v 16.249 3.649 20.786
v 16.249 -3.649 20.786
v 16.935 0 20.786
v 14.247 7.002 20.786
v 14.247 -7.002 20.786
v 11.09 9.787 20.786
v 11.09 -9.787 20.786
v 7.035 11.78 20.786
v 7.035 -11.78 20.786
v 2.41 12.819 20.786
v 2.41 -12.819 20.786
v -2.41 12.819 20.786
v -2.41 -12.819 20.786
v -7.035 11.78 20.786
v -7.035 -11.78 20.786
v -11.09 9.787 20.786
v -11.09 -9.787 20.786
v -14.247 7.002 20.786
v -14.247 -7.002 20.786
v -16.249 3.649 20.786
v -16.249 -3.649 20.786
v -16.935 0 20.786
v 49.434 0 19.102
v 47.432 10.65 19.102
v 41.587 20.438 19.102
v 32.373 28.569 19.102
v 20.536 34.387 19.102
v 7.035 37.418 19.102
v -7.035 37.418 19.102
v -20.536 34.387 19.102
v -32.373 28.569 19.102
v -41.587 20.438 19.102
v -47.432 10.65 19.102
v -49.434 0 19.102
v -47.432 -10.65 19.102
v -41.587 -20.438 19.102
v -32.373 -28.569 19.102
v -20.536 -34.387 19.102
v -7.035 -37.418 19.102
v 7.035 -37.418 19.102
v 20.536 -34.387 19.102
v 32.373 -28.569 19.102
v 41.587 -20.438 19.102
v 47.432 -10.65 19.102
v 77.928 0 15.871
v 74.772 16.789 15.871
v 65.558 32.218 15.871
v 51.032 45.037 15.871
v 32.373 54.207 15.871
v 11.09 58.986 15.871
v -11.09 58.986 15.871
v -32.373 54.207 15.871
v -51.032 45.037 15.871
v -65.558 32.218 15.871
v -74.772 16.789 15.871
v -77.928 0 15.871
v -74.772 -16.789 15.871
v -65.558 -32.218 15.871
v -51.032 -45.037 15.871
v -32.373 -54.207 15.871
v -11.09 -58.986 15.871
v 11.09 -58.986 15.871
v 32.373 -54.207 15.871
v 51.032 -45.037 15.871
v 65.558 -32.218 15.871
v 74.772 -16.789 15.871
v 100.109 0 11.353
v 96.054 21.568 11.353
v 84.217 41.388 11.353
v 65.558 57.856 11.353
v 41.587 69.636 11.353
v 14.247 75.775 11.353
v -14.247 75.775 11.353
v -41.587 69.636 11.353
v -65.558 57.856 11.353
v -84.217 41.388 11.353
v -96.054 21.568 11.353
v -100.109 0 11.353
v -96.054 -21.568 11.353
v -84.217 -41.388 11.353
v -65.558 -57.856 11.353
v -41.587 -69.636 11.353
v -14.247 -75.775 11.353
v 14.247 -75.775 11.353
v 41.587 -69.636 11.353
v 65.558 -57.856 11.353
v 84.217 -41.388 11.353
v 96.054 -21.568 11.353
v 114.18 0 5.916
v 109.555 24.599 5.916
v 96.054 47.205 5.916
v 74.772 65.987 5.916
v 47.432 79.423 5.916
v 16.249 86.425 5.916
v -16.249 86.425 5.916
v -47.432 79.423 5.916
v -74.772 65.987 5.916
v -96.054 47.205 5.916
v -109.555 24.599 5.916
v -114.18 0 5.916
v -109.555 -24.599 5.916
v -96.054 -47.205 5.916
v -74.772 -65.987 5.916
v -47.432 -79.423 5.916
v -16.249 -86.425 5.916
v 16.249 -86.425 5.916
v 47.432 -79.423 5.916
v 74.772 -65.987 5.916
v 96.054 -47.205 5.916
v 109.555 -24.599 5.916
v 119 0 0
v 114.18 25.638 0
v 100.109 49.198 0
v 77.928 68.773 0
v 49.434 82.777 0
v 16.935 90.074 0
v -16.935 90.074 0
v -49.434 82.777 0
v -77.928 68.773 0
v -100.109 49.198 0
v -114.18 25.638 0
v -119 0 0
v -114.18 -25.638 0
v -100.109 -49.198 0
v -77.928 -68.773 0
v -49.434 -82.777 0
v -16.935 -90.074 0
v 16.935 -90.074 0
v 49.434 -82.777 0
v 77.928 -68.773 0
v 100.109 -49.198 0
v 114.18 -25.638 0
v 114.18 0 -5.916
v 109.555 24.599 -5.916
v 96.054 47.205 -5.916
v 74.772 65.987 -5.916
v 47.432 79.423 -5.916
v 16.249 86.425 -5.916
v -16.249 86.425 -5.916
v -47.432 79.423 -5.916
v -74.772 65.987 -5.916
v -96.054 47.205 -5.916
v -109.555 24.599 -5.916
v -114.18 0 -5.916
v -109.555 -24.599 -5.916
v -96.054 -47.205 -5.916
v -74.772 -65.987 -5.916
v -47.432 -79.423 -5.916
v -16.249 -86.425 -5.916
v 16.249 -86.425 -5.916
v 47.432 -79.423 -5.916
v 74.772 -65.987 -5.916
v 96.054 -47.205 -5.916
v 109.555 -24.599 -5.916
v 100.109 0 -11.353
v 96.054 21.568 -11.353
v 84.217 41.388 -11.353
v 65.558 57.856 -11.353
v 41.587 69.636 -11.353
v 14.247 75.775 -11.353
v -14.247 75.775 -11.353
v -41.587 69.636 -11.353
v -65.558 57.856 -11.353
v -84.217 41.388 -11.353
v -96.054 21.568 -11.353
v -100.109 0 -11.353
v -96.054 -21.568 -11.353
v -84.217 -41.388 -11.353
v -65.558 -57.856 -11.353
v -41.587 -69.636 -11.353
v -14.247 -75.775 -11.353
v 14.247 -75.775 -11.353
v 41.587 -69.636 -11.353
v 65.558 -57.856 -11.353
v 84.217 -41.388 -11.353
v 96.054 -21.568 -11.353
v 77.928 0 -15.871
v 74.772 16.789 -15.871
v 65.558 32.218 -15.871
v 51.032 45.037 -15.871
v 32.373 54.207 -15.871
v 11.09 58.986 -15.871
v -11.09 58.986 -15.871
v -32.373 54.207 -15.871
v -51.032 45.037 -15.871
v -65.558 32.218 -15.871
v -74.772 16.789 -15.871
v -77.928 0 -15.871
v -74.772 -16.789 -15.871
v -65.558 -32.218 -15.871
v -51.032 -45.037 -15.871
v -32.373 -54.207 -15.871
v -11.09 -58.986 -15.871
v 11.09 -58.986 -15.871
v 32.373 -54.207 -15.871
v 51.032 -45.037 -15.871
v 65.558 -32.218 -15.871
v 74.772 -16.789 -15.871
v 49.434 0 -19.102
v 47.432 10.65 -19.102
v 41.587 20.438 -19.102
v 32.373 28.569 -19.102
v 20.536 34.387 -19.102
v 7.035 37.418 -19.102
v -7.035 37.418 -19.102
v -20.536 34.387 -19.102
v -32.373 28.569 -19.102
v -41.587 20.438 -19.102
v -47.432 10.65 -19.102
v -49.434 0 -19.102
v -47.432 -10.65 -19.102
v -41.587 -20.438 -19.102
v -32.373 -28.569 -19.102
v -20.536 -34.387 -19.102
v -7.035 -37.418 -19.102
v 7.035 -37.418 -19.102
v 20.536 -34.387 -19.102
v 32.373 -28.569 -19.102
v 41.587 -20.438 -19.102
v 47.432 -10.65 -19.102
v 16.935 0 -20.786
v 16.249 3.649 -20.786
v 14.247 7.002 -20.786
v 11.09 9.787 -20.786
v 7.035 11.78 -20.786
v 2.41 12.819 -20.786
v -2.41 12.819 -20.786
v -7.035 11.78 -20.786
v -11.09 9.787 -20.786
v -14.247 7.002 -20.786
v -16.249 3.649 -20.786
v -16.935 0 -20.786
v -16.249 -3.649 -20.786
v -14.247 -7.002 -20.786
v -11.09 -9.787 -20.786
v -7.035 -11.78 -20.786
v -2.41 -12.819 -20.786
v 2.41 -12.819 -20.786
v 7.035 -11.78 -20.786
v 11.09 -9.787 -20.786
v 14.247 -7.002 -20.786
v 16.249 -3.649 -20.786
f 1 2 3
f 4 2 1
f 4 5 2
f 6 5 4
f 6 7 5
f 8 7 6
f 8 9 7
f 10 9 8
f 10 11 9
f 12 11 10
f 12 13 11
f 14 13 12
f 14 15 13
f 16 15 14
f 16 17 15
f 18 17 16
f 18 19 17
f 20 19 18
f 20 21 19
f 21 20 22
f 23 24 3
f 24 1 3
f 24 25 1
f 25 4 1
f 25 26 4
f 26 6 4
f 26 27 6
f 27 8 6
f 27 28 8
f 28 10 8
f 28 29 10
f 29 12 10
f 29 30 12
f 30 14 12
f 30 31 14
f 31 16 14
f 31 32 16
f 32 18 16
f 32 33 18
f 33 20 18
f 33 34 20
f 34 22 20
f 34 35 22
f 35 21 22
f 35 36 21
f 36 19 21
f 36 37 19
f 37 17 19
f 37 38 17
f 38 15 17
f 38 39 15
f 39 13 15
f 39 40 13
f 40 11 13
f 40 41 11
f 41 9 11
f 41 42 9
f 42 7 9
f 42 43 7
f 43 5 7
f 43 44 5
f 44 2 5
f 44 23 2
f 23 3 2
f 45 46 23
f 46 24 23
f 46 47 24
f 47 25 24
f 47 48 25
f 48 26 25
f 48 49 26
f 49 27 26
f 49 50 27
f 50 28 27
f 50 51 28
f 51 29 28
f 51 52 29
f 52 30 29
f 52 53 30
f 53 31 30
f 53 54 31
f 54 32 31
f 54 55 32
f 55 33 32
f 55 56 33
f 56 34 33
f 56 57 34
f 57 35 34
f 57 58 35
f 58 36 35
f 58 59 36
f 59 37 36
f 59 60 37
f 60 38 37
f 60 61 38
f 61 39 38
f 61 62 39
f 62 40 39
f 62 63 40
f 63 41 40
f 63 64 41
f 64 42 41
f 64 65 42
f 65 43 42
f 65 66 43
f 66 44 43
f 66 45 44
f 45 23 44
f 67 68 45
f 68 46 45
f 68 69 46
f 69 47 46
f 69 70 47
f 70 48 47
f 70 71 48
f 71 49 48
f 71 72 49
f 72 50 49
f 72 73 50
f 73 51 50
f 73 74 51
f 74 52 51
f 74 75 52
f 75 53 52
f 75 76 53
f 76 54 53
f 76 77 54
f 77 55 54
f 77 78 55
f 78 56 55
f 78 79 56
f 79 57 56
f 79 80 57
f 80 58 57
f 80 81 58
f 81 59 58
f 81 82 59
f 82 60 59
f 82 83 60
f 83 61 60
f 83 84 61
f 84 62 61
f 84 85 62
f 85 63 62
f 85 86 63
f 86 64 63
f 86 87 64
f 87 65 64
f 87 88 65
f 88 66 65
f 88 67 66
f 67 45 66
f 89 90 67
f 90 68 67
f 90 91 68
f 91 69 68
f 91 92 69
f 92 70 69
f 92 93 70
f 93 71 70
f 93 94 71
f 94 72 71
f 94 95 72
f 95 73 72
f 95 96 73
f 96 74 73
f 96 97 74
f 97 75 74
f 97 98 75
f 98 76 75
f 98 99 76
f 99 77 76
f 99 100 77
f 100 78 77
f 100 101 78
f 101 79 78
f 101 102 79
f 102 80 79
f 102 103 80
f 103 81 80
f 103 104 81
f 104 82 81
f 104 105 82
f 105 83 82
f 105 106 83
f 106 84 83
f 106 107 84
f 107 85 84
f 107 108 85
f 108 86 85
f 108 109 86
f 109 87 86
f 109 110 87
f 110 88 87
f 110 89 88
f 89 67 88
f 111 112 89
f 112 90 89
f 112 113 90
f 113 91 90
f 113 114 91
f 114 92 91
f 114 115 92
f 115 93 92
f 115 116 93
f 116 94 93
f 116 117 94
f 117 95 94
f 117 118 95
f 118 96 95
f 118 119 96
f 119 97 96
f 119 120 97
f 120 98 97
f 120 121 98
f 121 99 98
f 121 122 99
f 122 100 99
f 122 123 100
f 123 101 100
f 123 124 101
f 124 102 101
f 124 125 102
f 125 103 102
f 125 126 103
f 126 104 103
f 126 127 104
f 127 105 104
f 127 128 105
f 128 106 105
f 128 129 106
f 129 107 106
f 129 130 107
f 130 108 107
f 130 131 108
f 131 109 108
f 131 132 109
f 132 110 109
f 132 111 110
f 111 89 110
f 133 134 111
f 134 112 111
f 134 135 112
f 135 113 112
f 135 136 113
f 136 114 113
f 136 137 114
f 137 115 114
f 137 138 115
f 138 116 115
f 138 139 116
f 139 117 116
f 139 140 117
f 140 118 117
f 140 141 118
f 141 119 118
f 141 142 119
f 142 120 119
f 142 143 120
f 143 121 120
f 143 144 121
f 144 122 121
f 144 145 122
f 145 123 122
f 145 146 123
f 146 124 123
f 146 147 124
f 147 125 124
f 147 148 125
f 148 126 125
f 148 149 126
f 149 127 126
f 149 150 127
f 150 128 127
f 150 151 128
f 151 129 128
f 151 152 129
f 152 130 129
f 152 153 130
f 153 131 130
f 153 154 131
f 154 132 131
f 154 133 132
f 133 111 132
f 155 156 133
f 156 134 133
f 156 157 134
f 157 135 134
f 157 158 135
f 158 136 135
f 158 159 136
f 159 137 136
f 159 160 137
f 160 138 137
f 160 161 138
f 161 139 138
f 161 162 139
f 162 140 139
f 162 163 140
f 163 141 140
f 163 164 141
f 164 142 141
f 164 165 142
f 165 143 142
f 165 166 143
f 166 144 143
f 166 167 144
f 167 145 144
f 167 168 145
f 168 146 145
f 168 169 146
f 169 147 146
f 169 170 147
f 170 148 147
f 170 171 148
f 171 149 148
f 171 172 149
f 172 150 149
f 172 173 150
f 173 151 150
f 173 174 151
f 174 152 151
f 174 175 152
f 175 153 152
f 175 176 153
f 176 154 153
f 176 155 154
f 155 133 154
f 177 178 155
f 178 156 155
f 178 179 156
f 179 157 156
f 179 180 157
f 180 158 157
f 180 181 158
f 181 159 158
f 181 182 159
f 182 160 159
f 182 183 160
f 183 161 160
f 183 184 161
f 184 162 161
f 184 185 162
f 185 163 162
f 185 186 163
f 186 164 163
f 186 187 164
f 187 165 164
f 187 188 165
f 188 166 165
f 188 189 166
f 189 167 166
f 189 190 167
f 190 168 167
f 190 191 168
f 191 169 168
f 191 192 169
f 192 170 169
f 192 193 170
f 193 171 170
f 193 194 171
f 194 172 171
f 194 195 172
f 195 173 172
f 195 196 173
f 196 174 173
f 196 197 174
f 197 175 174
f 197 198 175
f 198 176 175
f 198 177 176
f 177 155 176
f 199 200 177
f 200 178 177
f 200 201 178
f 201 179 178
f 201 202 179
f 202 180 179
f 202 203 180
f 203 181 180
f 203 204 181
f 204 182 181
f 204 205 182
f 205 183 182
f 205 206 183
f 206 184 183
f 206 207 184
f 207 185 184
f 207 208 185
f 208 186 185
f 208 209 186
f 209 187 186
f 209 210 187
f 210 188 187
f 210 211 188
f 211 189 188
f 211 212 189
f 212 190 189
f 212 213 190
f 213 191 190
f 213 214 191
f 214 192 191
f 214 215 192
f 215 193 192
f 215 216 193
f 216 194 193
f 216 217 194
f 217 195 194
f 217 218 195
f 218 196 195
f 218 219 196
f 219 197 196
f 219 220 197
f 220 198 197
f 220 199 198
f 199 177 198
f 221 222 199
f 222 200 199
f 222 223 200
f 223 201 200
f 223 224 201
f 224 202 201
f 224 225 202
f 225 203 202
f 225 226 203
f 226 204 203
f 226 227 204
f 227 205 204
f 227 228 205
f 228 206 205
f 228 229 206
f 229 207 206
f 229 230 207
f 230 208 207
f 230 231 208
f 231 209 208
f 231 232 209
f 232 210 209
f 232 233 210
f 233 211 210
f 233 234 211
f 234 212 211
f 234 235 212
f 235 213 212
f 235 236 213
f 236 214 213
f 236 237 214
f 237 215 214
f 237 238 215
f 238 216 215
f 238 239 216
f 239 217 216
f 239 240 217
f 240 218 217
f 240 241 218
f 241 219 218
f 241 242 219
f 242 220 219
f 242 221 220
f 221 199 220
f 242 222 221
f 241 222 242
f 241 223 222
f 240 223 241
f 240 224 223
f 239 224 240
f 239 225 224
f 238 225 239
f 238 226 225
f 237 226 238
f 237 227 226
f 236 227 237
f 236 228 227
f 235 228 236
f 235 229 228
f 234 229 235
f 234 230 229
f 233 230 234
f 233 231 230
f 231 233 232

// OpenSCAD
// Generated by SolidPython 1.0.1 on 2020-07-29 00:46:53


scale(v = [17, 13, 3]) {
	sphere(r = 7);
}
/***********************************************
*********      SolidPython code:      **********
************************************************
 
# import packages: SolidPython
from solid import *
from solid.utils import *
from itertools import chain, combinations, permutations


class Resize:

    def __init__(self, scad_file):
        self.scad_file = scad_file
        #self.scad_file = import_scad(scad_file)
        # cone/cylinder param:
        self.r1 = 0
        self.r2 = 0
        self.h = 0
        # rectangular prism param:
        self.w = 0
        self.l = 0
        # ellipse param:
        self.r = 0

    # import OpenScad code (file name corresponds to shape)


    # classify shape + parameters
    def assign(self, param1, param2, param3):
        if self.scad_file == 'cone.scad':
            self.r1 = param1
            self.r2 = param2
            self.h = param3
        elif self.scad_file == 'cylinder.scad':
            self.r1 = param1
            self.r2 = param2
            self.h = param3
        elif self.scad_file == 'rectangularPrism.scad':
            self.h = param1
            self.l = param2
            self.w = param3
        else:
            self.r = param1
            self.h = param2

    # resize parameters
    def iterate(self):
        x = range(3, 20, 2)
        i = 1
        if self.scad_file == 'cone.scad':
            tempList = list(permutations(x, 2))
            for temp in tempList:
                param1 = temp[0]
                param2 = temp[1]
                filepath = 'produced_scad_files/' + 'cone' + str(param1) + '_' + str(param2) + '_' + '.scad'
                scad_render_to_file(cylinder(h=param1, r1=param2, r2=0), filepath)

        elif self.scad_file == 'cylinder.scad':
            tempList = list(permutations(x, 3))
            for temp in tempList:
                param1 = temp[0]
                param2 = temp[1]
                filepath = 'produced_scad_files/' + 'cylinder' + str(param1) + '_' + str(param2) + '_' + '.scad'
                scad_render_to_file(cylinder(h=param1, r1=param2, r2=param2), filepath)

        elif self.scad_file == 'rectangularPrism.scad':
            tempList = list(permutations(x, 3))
            for temp in tempList:
                param1 = temp[0]
                param2 = temp[1]
                param3 = temp[2]
                filepath = 'produced_scad_files/' + 'rectangularPrism' + str(param1) + '_' + str(param2) + '_' + str(
                    param3) + '.scad'
                scad_render_to_file(cube(size=(param1, param2, param3)), filepath)

        elif self.scad_file == 'ellipse.scad':
            tempList = list(permutations(x, 4))
            for temp in tempList:
                param1 = temp[0]
                param2 = temp[1]
                param3 = temp[2]
                param4 = temp[3]
                filepath = 'produced_scad_files/' + 'ellipse' + str(param1) + '_' + str(param2) + '_' + str(param3) + '_' + str(param4) + '.scad'
                scad_render_to_file(scale([param1, param2, param3])(sphere(r=param4)), filepath)

    def render_to_scadfile(self):
        scad_render_to_file(scad, 'example.scad') 
 
************************************************/
